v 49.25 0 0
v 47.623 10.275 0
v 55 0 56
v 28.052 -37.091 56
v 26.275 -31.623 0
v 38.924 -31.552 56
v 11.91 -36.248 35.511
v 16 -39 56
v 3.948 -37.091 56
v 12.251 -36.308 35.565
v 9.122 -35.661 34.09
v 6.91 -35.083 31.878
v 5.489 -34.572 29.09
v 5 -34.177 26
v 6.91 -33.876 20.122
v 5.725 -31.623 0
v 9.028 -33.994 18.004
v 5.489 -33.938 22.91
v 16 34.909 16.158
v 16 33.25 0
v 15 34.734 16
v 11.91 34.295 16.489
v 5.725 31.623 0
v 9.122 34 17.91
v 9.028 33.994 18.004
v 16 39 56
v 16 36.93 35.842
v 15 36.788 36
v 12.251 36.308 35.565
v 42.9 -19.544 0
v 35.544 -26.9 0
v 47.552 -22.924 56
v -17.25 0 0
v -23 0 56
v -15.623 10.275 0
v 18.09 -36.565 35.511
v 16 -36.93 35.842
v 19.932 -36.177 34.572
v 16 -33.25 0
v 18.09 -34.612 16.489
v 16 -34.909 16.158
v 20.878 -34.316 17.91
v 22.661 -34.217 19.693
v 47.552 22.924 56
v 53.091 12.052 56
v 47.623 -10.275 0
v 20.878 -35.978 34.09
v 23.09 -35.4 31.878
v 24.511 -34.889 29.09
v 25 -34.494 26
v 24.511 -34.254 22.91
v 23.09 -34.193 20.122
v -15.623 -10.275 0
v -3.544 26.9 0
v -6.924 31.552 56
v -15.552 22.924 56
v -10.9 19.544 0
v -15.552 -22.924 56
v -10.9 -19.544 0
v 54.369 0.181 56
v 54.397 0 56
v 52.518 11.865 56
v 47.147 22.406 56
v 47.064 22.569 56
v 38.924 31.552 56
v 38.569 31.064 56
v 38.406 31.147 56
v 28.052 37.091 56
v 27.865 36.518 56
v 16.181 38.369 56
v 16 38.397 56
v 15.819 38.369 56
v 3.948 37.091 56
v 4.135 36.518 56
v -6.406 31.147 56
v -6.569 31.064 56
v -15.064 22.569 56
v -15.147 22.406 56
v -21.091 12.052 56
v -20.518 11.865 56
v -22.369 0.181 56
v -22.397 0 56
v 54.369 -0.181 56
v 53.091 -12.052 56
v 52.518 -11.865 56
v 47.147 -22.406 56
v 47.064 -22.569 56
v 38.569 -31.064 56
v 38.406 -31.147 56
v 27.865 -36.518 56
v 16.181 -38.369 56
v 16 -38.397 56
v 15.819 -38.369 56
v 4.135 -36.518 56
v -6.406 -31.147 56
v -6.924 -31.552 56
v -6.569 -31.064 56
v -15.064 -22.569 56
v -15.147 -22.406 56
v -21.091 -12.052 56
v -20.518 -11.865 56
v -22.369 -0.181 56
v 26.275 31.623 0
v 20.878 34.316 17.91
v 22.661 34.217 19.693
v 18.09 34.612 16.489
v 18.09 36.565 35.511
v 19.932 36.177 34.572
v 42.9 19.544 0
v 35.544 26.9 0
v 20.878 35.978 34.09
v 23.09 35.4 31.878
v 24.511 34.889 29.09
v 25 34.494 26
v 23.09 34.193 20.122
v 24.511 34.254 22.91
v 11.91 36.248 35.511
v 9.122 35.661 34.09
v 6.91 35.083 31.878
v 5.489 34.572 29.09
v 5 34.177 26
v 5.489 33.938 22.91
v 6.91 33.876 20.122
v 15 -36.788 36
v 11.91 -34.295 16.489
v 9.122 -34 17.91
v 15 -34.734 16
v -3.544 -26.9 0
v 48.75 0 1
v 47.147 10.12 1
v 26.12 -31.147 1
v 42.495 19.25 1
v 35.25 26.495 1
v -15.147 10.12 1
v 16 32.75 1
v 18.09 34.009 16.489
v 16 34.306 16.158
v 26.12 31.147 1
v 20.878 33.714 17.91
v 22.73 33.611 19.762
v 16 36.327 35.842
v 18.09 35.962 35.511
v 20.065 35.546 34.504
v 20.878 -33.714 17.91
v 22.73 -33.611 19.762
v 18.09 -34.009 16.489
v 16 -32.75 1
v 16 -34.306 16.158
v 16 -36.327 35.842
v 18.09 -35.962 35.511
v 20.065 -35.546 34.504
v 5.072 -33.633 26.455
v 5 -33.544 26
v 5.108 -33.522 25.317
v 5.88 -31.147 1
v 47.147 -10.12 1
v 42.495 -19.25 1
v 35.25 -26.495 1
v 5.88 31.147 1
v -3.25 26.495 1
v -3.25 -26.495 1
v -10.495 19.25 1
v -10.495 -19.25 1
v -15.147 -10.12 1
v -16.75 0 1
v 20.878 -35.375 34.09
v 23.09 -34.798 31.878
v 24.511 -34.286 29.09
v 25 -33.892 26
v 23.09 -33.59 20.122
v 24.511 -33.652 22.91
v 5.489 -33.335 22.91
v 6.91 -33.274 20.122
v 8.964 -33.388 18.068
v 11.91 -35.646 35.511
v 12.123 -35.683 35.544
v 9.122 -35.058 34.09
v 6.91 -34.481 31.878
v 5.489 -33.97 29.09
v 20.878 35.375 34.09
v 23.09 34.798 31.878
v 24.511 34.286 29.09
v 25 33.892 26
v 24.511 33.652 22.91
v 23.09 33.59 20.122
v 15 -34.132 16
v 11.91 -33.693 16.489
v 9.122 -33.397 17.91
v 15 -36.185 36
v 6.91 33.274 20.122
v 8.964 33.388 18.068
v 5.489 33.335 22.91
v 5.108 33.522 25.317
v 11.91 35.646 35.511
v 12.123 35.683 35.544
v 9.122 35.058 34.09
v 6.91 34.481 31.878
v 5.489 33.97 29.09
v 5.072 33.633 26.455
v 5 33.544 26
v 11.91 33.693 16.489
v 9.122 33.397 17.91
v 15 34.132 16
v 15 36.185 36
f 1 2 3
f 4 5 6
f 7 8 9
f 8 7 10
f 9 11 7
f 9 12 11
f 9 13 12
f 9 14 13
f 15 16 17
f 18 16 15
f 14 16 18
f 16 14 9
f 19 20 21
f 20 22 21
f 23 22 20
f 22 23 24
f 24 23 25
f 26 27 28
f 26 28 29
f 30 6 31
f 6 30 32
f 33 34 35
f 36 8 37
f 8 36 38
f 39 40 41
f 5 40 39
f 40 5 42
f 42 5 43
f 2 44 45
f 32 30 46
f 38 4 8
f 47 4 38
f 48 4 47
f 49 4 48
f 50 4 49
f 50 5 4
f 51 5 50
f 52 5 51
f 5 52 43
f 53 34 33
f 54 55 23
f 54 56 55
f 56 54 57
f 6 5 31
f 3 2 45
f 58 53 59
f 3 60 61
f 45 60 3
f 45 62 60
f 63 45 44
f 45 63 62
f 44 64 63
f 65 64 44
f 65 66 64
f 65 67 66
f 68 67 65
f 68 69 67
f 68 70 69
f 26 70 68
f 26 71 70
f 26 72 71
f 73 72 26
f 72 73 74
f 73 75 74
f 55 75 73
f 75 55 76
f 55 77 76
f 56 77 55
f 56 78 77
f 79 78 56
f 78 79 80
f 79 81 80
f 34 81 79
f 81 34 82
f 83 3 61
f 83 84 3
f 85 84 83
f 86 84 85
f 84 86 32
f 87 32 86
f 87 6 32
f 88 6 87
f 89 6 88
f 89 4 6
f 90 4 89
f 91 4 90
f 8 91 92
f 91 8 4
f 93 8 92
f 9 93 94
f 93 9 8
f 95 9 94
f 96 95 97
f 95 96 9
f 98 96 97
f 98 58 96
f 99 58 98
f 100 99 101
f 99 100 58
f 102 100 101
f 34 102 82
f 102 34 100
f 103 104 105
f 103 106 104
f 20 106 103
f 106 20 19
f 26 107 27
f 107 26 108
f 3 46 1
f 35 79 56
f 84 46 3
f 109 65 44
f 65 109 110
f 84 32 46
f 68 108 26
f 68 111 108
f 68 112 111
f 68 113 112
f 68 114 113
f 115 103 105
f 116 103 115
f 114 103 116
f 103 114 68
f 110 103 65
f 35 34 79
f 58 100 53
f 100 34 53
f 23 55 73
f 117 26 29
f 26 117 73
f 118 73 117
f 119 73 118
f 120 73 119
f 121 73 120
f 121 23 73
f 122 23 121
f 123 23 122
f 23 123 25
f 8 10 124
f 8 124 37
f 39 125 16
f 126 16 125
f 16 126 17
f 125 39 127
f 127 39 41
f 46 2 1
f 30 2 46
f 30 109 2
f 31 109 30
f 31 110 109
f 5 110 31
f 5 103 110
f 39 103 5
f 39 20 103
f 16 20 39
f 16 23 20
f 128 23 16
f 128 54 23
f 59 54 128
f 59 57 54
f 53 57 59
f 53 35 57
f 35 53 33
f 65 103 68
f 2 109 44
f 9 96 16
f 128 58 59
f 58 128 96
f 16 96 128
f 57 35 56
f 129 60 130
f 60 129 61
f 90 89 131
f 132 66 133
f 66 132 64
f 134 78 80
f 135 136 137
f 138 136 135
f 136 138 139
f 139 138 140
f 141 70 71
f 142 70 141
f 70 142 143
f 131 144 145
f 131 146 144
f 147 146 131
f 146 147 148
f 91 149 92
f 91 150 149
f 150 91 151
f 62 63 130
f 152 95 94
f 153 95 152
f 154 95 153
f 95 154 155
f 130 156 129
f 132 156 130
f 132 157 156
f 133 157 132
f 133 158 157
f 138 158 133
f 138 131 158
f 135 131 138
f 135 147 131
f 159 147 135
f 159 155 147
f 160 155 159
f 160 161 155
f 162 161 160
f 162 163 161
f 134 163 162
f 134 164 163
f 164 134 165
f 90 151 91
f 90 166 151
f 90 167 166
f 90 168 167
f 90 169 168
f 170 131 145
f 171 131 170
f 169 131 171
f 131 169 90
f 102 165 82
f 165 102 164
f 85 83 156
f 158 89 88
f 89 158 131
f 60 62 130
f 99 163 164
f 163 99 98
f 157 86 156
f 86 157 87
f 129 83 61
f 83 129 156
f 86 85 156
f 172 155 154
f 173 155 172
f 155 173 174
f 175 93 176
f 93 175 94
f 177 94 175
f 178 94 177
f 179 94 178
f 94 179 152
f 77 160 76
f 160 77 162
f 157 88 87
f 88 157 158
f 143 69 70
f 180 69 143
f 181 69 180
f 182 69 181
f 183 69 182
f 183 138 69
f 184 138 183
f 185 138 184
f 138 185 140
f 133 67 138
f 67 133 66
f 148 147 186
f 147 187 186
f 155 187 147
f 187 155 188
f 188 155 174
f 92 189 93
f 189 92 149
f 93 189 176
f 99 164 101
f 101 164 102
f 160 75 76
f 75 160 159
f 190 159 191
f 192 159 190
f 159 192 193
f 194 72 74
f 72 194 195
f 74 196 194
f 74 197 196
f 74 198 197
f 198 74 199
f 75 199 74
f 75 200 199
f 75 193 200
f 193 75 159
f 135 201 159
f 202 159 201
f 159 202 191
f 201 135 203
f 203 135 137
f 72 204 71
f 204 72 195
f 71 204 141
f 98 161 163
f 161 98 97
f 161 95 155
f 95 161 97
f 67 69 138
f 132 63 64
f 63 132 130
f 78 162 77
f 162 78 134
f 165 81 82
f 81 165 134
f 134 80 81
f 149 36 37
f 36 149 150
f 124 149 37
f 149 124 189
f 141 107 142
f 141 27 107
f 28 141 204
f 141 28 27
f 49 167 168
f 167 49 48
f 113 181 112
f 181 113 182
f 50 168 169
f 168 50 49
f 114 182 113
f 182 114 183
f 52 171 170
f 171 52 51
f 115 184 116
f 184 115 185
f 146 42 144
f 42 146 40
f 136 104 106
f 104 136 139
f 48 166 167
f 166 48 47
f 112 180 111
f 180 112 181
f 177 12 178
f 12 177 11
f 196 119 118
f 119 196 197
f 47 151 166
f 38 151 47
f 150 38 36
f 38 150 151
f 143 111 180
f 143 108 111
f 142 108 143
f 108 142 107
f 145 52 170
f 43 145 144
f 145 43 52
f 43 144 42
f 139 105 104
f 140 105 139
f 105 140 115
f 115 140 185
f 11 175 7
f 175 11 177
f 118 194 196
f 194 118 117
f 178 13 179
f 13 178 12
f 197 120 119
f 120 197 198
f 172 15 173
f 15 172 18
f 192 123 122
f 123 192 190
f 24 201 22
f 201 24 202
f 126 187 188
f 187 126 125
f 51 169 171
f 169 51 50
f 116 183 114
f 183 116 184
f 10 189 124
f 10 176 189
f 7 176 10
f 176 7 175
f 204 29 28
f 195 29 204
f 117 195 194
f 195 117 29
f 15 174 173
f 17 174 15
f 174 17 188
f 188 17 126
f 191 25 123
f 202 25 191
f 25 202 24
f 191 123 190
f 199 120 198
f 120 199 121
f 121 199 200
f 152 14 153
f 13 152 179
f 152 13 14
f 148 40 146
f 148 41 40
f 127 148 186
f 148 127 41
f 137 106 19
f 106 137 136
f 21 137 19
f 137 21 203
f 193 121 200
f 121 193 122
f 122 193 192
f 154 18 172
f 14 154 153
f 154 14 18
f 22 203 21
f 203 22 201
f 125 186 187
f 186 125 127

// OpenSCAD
$fn = 20;
/*
    A cup holder upgrade for the toyota rav4 (v1.4)

    Includes: 
    - Two options for the holder size (twoBig, oneBigOneSmall)
    - Phone holders at either end
    - Adjustable cup holder size


Note: This design is a learning tool for openSCAD, while the design is functional, the code should not be used as a reference for best (or even good) practices for writing openSCAD code (includes hardcoded values, hidden dependencies between variables, non-modular etc.)

*/



// oneLargerHolderOneSmallerHolder, twoLargerHolders
cup_holders_mode = "twoLargerHolders";

cup_holder_y_offset = 2.5;
cup_holder_center_offset= 43;
cup_holder_height=120;
cup_holder_floor_depth=10;

cup_holder_1_top_radius=95;
cup_holder_1_botton_radius=95;

cup_holder_2_top_radius=85;
cup_holder_2_botton_radius=75;

phone_holder1_offset=-110;
phone_holder2_offset=90;

phone_holder_width=23;


phone_holder_floor_depth=12;
phone_holder_height=100;
phone_holder_depth=100;


// Mode: simple or rounded - (this is redundent in newer builds of openSCAD, as at Jan 2025, the development build (with peformance improvments, i.e. manfold) will run this model, with minkowski transform without lagging
$mode = "rounded";

// IMPORTANT - Ensure these match your cup holder (toyata rav4 set below)
in_car_cup_holder_height = 56;
in_car_cup_holder_top_diameter = 78;
in_car_cup_holder_bottom_diameter = 66.5;
in_car_cup_holder_center_offset = 16;


holder_length=240;
holder_width=110;
holder_depth=100;




module cupHolderSizer(){

wall_thickness=1;
sizer_bottom_offset=10;

difference(){
    translate([in_car_cup_holder_center_offset, 0, 0])
    cylinder(h=in_car_cup_holder_height,d1=in_car_cup_holder_bottom_diameter, d2=in_car_cup_holder_top_diameter);
    
    // cut-out to save material 

    translate([in_car_cup_holder_center_offset, 0, wall_thickness])
    cylinder(h=in_car_cup_holder_height,d1=in_car_cup_holder_bottom_diameter-wall_thickness, d2=in_car_cup_holder_top_diameter-wall_thickness);
    

    // finger hole to get out

    translate([15, 100, in_car_cup_holder_height-30])
    rotate([90, 0, 0])
    #cylinder(h=1000,d=20);


}
}


cupHolderSizer();

        
